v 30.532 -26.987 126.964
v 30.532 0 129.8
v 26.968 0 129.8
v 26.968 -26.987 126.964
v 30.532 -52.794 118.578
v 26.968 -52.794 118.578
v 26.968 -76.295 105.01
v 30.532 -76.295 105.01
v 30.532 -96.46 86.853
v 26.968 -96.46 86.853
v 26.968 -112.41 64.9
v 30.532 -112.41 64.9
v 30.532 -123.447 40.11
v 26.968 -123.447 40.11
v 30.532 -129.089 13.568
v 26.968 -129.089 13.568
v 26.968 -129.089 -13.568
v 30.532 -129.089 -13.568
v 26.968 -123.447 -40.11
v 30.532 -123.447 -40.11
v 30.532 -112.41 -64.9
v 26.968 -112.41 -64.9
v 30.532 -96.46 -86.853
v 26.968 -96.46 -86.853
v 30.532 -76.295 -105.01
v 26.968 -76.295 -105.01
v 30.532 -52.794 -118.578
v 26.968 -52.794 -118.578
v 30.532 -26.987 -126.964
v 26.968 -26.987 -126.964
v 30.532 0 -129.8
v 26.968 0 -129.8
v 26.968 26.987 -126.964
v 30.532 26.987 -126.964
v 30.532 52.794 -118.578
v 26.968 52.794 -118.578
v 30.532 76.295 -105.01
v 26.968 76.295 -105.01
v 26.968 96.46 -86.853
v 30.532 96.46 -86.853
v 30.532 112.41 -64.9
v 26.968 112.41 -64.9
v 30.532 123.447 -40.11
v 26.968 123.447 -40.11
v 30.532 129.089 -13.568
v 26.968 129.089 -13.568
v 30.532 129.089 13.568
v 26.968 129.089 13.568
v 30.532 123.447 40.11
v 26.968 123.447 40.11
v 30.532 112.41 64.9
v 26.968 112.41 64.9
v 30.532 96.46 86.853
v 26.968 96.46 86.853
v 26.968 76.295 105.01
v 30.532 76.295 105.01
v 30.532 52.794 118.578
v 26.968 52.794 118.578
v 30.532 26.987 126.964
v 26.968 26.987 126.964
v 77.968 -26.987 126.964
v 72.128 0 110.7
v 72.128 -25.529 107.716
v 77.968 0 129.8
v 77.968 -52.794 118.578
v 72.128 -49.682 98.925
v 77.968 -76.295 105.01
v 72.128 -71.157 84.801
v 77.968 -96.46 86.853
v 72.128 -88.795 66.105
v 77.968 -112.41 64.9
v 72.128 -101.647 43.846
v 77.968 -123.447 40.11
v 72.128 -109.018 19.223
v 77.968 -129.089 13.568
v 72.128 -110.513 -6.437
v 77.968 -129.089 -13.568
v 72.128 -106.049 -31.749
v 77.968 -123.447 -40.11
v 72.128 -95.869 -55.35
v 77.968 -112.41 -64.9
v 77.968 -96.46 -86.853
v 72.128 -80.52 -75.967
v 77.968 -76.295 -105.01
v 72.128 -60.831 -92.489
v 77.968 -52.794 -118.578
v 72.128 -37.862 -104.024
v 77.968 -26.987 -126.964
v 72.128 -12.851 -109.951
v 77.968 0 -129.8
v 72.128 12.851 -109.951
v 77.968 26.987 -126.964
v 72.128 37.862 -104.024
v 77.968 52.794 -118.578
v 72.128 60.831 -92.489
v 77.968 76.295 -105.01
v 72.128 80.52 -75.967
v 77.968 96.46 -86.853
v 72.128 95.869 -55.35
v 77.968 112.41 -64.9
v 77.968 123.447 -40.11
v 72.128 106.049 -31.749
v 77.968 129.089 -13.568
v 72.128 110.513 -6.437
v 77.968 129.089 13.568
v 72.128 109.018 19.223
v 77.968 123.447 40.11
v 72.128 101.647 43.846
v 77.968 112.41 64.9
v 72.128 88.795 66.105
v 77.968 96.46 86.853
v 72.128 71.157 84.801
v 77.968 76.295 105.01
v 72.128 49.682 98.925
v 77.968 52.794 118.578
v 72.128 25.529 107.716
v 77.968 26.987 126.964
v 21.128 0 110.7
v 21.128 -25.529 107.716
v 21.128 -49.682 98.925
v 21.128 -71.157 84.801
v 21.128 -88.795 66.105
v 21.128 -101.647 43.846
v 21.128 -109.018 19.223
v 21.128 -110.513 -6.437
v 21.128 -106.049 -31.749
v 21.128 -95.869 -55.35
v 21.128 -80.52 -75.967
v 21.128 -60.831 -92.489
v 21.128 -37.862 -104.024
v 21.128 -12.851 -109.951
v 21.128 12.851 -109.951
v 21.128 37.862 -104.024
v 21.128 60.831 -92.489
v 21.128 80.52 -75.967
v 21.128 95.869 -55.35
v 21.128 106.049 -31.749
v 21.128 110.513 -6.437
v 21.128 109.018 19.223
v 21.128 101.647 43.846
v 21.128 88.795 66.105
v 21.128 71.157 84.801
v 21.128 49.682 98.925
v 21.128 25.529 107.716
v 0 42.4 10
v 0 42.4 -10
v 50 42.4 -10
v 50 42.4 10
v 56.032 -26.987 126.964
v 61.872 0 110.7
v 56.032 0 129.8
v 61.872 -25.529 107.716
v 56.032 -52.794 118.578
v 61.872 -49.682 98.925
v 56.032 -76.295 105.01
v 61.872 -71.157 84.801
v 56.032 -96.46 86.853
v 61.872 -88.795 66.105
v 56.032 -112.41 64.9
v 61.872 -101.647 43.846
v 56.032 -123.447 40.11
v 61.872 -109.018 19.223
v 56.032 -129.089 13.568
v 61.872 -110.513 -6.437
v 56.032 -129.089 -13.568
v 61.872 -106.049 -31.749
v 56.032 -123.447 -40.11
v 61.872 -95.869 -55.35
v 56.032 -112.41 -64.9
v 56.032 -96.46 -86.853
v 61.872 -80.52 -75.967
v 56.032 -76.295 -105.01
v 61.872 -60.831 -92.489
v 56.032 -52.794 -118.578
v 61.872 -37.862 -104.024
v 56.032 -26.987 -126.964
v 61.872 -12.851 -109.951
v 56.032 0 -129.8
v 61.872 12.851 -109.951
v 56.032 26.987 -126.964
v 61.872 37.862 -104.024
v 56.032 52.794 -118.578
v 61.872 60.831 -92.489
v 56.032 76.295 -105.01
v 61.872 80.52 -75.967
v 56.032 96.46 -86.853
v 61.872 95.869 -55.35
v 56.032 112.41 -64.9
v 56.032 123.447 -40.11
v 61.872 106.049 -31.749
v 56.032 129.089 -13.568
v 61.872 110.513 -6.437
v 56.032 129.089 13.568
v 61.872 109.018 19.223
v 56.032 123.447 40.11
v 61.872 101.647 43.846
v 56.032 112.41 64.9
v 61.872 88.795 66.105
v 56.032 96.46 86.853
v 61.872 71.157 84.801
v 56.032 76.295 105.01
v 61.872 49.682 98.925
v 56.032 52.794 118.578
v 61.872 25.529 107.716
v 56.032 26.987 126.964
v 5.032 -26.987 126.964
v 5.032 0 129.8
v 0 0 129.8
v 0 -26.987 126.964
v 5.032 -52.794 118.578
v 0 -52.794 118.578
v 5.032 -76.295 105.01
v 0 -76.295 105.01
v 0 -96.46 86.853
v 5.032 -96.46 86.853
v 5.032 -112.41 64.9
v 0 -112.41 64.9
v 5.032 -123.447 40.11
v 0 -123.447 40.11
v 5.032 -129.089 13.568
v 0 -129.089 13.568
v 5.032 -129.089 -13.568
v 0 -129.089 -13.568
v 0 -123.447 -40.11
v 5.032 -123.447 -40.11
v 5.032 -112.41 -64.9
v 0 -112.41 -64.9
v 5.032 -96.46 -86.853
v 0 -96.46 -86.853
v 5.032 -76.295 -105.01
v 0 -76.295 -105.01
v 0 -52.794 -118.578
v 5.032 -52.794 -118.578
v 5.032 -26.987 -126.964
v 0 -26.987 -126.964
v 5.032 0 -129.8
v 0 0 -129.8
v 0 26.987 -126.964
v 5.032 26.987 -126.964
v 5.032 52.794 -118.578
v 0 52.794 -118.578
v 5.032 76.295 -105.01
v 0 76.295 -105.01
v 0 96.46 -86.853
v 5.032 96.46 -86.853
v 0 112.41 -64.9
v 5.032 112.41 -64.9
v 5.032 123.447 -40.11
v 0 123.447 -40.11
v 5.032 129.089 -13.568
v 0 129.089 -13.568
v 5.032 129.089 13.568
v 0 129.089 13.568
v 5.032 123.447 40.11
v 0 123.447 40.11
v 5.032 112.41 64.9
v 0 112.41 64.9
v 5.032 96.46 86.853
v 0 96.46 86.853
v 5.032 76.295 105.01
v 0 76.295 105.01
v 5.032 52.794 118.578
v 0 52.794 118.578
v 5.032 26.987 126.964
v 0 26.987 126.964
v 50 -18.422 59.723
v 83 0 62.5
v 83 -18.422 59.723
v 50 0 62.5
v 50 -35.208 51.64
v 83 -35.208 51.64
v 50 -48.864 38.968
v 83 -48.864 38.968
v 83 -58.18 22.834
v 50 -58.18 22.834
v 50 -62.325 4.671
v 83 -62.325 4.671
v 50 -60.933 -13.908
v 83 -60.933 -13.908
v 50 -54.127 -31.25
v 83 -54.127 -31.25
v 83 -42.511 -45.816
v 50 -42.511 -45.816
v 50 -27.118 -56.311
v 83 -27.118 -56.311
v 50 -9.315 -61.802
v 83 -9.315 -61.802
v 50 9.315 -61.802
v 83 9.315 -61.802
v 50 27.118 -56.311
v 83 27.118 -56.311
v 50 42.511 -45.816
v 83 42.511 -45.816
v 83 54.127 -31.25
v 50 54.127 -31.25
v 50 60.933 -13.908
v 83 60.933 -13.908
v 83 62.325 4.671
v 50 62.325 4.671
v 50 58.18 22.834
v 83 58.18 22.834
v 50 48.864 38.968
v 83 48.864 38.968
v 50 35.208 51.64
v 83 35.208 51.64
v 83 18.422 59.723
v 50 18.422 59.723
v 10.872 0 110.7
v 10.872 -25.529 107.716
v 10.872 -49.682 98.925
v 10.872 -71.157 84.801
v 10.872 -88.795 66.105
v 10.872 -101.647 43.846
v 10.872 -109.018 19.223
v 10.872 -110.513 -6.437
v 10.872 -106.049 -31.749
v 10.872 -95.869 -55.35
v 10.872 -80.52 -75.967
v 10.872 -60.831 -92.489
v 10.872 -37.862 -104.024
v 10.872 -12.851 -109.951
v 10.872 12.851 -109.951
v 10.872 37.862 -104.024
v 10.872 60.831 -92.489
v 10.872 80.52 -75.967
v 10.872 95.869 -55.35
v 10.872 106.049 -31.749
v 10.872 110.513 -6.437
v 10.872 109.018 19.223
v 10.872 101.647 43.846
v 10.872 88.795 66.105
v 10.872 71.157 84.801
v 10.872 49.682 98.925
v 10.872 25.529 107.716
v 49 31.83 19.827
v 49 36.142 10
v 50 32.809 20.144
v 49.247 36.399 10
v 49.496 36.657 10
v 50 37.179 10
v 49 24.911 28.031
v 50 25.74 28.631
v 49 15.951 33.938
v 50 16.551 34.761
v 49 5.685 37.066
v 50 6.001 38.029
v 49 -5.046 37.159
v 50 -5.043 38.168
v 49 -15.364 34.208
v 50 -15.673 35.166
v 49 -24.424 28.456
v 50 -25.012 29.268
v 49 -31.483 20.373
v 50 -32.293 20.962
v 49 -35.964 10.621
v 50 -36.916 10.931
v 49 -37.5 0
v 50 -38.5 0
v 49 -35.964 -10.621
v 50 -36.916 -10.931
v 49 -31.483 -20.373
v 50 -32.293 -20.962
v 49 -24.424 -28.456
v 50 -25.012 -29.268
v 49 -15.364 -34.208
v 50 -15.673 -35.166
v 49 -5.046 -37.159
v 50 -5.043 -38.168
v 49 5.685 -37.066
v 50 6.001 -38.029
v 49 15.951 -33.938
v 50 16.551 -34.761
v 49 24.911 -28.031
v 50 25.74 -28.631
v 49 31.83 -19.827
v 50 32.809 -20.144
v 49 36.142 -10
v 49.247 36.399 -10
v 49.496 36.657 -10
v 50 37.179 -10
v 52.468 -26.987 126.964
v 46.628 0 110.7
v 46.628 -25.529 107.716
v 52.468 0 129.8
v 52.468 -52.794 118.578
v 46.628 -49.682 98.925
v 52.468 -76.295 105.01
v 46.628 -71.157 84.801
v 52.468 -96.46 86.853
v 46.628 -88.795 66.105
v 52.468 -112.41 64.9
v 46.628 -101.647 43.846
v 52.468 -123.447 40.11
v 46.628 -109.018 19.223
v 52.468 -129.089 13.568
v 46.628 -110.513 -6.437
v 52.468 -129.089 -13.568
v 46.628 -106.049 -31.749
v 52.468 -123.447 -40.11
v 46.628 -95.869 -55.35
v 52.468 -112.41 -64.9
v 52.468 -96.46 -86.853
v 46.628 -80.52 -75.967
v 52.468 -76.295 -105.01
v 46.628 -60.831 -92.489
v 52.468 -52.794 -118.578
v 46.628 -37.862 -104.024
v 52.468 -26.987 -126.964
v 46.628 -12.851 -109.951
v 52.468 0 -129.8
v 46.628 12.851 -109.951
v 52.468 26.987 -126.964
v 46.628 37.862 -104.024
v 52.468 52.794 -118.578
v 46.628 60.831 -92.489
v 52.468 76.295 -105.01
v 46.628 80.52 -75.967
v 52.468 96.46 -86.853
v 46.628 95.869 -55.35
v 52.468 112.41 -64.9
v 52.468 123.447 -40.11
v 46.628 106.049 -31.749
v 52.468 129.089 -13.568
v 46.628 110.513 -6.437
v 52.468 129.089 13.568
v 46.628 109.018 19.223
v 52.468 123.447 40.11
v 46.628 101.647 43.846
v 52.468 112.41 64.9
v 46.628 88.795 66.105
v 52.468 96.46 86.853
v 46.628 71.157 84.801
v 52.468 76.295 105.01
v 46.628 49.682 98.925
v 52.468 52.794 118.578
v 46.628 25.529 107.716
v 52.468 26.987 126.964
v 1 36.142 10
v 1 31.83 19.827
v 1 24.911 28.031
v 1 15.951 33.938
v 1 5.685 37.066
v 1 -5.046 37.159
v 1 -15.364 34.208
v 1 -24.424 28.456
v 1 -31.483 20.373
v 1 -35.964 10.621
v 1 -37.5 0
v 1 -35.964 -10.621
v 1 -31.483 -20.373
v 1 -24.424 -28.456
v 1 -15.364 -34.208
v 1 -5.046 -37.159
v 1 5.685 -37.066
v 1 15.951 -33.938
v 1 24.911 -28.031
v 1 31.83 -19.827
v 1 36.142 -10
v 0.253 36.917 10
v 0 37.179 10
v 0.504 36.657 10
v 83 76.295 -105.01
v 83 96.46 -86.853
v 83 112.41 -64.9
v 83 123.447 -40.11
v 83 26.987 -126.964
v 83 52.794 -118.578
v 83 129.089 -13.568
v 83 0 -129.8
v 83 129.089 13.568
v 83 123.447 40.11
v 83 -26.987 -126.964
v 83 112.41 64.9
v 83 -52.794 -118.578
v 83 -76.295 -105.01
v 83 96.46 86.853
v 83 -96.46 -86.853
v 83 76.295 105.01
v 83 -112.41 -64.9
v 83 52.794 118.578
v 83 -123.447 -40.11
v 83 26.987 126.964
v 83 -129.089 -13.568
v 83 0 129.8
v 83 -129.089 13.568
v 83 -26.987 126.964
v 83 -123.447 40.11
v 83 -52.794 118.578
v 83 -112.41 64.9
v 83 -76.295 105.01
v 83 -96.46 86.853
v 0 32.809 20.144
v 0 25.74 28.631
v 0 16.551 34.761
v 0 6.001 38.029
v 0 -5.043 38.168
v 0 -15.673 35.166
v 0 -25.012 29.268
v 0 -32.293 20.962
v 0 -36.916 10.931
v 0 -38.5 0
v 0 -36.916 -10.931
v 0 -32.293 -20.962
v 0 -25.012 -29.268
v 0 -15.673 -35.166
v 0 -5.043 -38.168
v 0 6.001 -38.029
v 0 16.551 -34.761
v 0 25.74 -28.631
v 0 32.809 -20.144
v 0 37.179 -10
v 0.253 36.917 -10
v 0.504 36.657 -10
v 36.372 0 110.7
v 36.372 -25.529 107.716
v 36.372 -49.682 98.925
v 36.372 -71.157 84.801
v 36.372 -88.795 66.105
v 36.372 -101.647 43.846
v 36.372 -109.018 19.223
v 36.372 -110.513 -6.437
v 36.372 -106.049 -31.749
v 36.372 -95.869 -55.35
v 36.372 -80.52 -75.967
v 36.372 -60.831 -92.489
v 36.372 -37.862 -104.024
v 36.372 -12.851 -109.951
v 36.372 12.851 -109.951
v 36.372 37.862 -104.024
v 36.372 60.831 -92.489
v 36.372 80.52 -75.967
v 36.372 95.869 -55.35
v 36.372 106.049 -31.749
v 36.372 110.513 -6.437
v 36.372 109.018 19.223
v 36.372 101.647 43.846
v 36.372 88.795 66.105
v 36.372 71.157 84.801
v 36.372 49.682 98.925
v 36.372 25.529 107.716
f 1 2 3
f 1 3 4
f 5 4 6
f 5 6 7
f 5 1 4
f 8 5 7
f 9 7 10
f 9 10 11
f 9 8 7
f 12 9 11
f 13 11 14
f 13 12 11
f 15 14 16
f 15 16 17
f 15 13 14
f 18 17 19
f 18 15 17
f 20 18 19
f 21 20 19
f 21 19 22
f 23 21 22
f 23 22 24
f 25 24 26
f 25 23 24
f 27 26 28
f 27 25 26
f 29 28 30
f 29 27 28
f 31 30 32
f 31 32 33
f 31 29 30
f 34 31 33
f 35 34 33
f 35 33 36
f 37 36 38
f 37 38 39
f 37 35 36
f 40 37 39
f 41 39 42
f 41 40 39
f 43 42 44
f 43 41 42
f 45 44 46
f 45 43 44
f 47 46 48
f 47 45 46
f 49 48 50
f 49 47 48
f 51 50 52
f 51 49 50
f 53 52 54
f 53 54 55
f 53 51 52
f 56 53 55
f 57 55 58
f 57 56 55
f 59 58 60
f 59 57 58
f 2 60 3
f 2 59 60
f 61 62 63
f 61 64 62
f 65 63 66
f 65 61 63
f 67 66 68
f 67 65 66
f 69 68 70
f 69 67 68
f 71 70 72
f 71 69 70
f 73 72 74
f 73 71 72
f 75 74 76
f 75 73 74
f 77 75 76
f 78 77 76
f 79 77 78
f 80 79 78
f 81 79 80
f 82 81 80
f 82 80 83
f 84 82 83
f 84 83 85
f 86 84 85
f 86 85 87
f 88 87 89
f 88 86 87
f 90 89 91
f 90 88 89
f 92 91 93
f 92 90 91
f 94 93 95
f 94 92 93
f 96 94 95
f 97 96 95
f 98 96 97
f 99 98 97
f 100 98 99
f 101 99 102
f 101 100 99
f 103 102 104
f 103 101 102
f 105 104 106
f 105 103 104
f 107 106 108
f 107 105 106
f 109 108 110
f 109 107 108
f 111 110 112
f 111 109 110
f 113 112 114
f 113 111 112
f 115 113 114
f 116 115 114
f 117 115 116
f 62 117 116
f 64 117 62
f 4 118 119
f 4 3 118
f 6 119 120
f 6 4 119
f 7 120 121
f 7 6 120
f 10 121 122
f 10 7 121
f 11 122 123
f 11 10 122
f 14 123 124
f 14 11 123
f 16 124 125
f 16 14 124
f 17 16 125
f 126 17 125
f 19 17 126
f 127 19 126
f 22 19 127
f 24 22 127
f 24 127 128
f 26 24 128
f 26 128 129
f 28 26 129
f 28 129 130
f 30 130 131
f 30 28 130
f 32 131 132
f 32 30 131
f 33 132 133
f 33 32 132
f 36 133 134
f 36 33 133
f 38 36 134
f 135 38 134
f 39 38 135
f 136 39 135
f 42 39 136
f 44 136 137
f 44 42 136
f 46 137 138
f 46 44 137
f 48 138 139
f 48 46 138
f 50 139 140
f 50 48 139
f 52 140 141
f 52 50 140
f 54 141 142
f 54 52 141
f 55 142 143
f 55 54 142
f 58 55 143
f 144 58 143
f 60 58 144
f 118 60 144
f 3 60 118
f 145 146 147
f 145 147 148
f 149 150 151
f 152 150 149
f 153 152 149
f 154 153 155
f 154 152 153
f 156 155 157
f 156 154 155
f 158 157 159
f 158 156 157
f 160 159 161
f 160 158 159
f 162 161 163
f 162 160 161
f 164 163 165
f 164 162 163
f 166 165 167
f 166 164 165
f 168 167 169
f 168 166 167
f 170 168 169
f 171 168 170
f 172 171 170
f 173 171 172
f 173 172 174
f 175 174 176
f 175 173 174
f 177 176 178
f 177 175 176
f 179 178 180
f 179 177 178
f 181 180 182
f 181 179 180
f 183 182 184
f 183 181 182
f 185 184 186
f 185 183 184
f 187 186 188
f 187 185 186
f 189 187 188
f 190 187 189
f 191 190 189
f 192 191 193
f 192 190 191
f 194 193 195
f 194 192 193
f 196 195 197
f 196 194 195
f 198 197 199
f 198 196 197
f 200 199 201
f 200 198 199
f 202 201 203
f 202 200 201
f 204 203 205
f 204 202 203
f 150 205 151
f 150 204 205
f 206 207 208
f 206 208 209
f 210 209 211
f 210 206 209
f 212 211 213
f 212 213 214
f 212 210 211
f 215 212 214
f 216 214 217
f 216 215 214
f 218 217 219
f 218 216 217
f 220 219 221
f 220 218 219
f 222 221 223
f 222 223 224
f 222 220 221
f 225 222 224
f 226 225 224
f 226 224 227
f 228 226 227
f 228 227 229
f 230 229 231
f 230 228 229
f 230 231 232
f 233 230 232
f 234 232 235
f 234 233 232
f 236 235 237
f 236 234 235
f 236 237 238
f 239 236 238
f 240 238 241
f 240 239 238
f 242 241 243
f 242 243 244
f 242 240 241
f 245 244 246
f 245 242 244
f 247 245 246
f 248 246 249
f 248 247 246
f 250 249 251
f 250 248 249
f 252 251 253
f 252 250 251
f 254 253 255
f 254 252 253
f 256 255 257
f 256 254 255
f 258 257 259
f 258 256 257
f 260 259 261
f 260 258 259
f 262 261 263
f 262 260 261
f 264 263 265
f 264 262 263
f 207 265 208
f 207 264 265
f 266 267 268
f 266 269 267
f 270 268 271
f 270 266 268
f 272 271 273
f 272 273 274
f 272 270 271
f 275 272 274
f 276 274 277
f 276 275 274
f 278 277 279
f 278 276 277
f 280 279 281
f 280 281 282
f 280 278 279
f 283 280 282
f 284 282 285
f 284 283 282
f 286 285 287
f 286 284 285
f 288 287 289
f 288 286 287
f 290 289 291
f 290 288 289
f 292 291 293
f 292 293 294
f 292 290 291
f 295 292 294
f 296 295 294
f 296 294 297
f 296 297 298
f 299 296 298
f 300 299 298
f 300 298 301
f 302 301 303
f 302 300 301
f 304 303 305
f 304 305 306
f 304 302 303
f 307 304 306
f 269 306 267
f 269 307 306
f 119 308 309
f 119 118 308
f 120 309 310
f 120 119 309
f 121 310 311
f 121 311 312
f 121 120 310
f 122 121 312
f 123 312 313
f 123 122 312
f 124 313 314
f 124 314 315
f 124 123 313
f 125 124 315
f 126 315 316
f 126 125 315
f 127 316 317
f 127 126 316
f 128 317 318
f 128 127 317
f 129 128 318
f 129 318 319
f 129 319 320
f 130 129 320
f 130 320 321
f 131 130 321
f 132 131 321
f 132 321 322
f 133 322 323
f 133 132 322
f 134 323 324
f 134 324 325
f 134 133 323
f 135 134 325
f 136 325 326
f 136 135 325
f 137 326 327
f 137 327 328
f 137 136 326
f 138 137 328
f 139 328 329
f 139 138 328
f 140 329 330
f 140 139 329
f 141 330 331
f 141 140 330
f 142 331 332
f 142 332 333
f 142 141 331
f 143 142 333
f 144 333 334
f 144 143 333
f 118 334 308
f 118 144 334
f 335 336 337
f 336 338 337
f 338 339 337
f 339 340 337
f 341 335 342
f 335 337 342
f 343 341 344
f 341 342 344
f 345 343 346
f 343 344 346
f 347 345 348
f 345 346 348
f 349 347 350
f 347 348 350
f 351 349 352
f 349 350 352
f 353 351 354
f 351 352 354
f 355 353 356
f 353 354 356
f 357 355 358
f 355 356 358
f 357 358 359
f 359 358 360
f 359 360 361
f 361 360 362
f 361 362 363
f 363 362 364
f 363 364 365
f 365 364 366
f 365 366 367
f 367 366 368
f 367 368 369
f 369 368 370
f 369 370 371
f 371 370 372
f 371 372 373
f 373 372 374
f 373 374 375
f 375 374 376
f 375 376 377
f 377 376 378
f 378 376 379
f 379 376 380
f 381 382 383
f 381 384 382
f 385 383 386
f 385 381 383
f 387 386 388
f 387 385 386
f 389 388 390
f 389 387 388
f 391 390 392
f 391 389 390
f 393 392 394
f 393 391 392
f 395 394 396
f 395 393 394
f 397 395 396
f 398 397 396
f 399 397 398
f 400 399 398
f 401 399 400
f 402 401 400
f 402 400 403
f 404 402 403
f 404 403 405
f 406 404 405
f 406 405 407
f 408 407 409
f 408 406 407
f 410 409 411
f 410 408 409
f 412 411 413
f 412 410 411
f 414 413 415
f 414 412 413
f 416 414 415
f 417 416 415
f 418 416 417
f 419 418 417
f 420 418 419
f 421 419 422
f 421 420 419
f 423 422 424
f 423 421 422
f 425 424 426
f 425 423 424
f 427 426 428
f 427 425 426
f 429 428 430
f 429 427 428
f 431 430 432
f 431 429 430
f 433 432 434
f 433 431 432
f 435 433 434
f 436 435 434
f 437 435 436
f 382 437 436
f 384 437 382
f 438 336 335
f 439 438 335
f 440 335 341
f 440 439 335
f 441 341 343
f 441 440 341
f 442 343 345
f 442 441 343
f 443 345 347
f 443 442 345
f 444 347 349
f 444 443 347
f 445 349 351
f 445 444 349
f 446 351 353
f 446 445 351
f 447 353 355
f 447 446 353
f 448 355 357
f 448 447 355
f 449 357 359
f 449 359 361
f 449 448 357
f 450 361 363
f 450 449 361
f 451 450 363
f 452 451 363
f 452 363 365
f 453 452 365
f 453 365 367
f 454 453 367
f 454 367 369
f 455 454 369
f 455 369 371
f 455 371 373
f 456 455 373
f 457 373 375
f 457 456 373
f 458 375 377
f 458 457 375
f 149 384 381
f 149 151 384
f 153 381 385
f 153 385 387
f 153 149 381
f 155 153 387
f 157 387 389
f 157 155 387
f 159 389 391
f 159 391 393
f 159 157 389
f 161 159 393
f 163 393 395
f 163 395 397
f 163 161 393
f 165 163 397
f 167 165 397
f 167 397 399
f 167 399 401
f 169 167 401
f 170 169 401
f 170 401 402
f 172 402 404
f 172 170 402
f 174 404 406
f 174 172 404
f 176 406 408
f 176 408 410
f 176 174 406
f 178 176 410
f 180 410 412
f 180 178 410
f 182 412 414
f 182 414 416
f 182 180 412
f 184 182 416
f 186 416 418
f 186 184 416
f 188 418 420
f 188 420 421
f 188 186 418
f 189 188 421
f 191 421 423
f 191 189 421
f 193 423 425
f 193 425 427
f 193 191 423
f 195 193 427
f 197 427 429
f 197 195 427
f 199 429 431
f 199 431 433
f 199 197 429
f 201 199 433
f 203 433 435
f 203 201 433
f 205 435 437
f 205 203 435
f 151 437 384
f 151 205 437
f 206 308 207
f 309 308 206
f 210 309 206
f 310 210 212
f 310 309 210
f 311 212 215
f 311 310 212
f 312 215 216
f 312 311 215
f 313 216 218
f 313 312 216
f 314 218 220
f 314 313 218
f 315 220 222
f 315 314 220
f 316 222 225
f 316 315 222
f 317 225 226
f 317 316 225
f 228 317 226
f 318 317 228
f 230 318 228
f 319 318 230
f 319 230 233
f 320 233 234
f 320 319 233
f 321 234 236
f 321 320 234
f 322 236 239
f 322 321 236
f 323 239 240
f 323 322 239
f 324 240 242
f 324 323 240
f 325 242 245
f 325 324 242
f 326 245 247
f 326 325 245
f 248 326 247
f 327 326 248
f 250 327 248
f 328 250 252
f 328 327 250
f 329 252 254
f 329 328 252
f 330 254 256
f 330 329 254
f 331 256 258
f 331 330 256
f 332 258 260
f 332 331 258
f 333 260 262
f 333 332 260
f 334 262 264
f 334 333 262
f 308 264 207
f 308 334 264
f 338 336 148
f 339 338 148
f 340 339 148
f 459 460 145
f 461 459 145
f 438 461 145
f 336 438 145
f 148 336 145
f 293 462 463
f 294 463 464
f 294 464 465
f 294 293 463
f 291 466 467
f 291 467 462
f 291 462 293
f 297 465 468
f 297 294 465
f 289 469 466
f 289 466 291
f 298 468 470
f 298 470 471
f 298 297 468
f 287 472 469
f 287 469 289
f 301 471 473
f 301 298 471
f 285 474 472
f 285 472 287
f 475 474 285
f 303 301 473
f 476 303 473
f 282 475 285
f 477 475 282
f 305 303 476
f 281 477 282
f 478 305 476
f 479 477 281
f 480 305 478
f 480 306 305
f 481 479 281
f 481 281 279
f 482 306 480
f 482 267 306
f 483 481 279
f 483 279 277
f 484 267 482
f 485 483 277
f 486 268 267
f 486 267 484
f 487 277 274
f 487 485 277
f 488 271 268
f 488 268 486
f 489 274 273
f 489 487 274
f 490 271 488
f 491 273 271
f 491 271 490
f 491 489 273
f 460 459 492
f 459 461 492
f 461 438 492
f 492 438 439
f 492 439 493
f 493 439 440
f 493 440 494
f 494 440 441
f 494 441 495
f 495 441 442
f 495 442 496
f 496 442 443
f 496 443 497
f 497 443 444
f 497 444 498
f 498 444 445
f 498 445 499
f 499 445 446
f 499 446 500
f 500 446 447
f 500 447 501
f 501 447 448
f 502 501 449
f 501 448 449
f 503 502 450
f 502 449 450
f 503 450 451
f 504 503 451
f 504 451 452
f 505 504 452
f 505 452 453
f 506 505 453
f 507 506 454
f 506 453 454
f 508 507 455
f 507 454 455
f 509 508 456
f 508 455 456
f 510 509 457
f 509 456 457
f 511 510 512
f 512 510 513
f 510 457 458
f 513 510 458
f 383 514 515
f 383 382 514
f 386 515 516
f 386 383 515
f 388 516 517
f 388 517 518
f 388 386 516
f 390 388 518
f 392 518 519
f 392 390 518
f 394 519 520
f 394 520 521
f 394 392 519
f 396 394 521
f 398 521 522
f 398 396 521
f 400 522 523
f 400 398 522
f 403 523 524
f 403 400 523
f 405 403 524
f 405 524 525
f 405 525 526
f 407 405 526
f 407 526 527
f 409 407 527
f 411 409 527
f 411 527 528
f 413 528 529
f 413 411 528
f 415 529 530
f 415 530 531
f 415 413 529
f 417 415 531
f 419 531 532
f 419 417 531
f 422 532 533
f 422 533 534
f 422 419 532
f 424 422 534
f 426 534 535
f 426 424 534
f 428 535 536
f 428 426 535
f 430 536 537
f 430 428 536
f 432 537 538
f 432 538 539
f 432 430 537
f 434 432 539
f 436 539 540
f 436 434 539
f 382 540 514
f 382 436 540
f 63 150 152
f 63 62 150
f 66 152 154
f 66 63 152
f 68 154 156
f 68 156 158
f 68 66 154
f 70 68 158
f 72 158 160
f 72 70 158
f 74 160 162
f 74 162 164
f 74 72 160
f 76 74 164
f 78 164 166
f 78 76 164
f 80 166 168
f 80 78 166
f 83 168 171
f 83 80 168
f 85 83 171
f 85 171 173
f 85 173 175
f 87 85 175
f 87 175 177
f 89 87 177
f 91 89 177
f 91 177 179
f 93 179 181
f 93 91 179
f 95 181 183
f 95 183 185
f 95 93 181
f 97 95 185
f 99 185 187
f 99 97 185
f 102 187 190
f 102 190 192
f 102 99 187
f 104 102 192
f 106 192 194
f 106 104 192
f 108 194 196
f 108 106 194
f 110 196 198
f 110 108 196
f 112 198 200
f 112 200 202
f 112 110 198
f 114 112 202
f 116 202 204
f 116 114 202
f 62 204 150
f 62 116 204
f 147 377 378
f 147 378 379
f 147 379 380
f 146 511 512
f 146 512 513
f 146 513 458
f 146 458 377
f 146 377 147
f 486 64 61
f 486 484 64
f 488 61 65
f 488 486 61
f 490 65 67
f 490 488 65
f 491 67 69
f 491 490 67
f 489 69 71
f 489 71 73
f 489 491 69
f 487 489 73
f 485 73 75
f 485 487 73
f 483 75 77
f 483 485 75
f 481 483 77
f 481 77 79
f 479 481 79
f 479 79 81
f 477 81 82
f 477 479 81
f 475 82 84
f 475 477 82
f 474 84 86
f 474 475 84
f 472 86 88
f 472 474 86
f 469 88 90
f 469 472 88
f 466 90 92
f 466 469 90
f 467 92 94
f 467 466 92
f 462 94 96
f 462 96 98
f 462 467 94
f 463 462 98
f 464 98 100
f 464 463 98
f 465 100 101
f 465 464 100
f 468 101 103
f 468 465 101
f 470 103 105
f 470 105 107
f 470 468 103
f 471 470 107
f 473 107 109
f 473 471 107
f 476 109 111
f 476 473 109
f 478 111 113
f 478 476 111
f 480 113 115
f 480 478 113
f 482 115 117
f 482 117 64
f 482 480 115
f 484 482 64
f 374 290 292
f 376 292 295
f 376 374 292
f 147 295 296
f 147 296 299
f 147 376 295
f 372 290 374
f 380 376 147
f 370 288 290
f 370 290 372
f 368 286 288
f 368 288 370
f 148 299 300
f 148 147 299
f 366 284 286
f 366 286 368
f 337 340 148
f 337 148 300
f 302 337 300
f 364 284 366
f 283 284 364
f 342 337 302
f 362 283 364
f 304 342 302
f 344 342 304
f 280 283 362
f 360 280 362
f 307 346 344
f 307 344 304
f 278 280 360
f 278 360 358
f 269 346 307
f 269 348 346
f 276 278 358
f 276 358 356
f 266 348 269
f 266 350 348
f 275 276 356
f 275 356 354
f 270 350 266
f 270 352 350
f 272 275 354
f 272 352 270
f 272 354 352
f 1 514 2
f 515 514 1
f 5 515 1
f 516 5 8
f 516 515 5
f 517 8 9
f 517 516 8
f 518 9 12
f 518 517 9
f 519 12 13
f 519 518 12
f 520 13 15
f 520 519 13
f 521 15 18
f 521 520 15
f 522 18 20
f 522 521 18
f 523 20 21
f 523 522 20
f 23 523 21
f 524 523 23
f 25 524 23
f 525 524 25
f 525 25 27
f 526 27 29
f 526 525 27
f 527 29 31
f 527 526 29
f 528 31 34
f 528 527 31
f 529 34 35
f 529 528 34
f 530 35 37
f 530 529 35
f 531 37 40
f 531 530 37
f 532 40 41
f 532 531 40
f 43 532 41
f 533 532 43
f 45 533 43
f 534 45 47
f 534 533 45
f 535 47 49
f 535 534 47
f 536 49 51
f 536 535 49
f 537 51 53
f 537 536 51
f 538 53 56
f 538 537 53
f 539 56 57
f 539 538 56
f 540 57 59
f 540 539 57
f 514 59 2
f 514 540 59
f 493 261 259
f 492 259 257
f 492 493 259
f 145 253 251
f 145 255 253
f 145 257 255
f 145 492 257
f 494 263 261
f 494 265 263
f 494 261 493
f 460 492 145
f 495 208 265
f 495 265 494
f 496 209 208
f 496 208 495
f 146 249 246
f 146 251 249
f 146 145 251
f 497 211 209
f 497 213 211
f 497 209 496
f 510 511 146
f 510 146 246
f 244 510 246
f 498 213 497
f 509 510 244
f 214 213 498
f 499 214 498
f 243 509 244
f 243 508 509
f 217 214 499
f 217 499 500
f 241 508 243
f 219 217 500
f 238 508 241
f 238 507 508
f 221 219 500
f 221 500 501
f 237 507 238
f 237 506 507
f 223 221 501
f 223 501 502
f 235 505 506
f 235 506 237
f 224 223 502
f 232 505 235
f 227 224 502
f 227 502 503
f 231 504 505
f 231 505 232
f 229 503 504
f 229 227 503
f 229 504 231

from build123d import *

# Parameters (mm, degrees)
PATTERN_LINEAR_1_COUNT = 3
PATTERN_LINEAR_1_PITCH = 25.5
CHAMFER_1_SIZE         = 1
SKETCH_4_W             = 20
SKETCH_4_H             = 6.257919358
CUT_EXTRUDE_1_DEPTH    = 202.457390036


with BuildPart() as part:
    # 草图1 → 旋转1 (revolve)
    with BuildSketch(Plane.XY, mode=Mode.PRIVATE) as revolve_1_sk:
        Polygon((0, 37.5), (0, 129.8), (83, 129.8), (83, 62.5), (50, 62.5), (50, 37.5), align=None)
    revolve(revolve_1_sk.sketch.rotate(Axis((0, 0, 0), (1, 0, 0)), 90), axis=Axis((0, 0, 0), (1, 0, 0)))

    # 草图2 → 切除-旋转1 (revolve, cut)
    with BuildSketch(Plane.XY, mode=Mode.PRIVATE) as cut_revolve_1_sk:
        Polygon((21.128051255, 110.7), (26.967507271, 129.8), (5.032492729, 129.8), (10.871948745, 110.7), align=None)
    cut_revolve_1 = revolve(cut_revolve_1_sk.sketch.rotate(Axis((0, 0, 0), (1, 0, 0)), 90), axis=Axis((0, 0, 0), (1, 0, 0)), mode=Mode.SUBTRACT)

    # 阵列(线性)1: 切除-旋转1 ×3
    with Locations(*[(i * PATTERN_LINEAR_1_PITCH, 0, 0) for i in range(1, PATTERN_LINEAR_1_COUNT)]):
        add(cut_revolve_1, mode=Mode.SUBTRACT)

    # 倒角1
    chamfer_1_edges = [part.edges().sort_by_distance(p)[0] for p in [
        (0, 0, -37.5),
        (50, 0, -37.5),
    ]]
    chamfer(chamfer_1_edges, length=CHAMFER_1_SIZE)

    # 草图4 → 切除-拉伸1 (cut, through all)
    with BuildSketch(Plane.ZY):
        with Locations((0, 39.271040416)):
            Rectangle(SKETCH_4_W, SKETCH_4_H)
    extrude(amount=-CUT_EXTRUDE_1_DEPTH, mode=Mode.SUBTRACT)


solid = part.part
